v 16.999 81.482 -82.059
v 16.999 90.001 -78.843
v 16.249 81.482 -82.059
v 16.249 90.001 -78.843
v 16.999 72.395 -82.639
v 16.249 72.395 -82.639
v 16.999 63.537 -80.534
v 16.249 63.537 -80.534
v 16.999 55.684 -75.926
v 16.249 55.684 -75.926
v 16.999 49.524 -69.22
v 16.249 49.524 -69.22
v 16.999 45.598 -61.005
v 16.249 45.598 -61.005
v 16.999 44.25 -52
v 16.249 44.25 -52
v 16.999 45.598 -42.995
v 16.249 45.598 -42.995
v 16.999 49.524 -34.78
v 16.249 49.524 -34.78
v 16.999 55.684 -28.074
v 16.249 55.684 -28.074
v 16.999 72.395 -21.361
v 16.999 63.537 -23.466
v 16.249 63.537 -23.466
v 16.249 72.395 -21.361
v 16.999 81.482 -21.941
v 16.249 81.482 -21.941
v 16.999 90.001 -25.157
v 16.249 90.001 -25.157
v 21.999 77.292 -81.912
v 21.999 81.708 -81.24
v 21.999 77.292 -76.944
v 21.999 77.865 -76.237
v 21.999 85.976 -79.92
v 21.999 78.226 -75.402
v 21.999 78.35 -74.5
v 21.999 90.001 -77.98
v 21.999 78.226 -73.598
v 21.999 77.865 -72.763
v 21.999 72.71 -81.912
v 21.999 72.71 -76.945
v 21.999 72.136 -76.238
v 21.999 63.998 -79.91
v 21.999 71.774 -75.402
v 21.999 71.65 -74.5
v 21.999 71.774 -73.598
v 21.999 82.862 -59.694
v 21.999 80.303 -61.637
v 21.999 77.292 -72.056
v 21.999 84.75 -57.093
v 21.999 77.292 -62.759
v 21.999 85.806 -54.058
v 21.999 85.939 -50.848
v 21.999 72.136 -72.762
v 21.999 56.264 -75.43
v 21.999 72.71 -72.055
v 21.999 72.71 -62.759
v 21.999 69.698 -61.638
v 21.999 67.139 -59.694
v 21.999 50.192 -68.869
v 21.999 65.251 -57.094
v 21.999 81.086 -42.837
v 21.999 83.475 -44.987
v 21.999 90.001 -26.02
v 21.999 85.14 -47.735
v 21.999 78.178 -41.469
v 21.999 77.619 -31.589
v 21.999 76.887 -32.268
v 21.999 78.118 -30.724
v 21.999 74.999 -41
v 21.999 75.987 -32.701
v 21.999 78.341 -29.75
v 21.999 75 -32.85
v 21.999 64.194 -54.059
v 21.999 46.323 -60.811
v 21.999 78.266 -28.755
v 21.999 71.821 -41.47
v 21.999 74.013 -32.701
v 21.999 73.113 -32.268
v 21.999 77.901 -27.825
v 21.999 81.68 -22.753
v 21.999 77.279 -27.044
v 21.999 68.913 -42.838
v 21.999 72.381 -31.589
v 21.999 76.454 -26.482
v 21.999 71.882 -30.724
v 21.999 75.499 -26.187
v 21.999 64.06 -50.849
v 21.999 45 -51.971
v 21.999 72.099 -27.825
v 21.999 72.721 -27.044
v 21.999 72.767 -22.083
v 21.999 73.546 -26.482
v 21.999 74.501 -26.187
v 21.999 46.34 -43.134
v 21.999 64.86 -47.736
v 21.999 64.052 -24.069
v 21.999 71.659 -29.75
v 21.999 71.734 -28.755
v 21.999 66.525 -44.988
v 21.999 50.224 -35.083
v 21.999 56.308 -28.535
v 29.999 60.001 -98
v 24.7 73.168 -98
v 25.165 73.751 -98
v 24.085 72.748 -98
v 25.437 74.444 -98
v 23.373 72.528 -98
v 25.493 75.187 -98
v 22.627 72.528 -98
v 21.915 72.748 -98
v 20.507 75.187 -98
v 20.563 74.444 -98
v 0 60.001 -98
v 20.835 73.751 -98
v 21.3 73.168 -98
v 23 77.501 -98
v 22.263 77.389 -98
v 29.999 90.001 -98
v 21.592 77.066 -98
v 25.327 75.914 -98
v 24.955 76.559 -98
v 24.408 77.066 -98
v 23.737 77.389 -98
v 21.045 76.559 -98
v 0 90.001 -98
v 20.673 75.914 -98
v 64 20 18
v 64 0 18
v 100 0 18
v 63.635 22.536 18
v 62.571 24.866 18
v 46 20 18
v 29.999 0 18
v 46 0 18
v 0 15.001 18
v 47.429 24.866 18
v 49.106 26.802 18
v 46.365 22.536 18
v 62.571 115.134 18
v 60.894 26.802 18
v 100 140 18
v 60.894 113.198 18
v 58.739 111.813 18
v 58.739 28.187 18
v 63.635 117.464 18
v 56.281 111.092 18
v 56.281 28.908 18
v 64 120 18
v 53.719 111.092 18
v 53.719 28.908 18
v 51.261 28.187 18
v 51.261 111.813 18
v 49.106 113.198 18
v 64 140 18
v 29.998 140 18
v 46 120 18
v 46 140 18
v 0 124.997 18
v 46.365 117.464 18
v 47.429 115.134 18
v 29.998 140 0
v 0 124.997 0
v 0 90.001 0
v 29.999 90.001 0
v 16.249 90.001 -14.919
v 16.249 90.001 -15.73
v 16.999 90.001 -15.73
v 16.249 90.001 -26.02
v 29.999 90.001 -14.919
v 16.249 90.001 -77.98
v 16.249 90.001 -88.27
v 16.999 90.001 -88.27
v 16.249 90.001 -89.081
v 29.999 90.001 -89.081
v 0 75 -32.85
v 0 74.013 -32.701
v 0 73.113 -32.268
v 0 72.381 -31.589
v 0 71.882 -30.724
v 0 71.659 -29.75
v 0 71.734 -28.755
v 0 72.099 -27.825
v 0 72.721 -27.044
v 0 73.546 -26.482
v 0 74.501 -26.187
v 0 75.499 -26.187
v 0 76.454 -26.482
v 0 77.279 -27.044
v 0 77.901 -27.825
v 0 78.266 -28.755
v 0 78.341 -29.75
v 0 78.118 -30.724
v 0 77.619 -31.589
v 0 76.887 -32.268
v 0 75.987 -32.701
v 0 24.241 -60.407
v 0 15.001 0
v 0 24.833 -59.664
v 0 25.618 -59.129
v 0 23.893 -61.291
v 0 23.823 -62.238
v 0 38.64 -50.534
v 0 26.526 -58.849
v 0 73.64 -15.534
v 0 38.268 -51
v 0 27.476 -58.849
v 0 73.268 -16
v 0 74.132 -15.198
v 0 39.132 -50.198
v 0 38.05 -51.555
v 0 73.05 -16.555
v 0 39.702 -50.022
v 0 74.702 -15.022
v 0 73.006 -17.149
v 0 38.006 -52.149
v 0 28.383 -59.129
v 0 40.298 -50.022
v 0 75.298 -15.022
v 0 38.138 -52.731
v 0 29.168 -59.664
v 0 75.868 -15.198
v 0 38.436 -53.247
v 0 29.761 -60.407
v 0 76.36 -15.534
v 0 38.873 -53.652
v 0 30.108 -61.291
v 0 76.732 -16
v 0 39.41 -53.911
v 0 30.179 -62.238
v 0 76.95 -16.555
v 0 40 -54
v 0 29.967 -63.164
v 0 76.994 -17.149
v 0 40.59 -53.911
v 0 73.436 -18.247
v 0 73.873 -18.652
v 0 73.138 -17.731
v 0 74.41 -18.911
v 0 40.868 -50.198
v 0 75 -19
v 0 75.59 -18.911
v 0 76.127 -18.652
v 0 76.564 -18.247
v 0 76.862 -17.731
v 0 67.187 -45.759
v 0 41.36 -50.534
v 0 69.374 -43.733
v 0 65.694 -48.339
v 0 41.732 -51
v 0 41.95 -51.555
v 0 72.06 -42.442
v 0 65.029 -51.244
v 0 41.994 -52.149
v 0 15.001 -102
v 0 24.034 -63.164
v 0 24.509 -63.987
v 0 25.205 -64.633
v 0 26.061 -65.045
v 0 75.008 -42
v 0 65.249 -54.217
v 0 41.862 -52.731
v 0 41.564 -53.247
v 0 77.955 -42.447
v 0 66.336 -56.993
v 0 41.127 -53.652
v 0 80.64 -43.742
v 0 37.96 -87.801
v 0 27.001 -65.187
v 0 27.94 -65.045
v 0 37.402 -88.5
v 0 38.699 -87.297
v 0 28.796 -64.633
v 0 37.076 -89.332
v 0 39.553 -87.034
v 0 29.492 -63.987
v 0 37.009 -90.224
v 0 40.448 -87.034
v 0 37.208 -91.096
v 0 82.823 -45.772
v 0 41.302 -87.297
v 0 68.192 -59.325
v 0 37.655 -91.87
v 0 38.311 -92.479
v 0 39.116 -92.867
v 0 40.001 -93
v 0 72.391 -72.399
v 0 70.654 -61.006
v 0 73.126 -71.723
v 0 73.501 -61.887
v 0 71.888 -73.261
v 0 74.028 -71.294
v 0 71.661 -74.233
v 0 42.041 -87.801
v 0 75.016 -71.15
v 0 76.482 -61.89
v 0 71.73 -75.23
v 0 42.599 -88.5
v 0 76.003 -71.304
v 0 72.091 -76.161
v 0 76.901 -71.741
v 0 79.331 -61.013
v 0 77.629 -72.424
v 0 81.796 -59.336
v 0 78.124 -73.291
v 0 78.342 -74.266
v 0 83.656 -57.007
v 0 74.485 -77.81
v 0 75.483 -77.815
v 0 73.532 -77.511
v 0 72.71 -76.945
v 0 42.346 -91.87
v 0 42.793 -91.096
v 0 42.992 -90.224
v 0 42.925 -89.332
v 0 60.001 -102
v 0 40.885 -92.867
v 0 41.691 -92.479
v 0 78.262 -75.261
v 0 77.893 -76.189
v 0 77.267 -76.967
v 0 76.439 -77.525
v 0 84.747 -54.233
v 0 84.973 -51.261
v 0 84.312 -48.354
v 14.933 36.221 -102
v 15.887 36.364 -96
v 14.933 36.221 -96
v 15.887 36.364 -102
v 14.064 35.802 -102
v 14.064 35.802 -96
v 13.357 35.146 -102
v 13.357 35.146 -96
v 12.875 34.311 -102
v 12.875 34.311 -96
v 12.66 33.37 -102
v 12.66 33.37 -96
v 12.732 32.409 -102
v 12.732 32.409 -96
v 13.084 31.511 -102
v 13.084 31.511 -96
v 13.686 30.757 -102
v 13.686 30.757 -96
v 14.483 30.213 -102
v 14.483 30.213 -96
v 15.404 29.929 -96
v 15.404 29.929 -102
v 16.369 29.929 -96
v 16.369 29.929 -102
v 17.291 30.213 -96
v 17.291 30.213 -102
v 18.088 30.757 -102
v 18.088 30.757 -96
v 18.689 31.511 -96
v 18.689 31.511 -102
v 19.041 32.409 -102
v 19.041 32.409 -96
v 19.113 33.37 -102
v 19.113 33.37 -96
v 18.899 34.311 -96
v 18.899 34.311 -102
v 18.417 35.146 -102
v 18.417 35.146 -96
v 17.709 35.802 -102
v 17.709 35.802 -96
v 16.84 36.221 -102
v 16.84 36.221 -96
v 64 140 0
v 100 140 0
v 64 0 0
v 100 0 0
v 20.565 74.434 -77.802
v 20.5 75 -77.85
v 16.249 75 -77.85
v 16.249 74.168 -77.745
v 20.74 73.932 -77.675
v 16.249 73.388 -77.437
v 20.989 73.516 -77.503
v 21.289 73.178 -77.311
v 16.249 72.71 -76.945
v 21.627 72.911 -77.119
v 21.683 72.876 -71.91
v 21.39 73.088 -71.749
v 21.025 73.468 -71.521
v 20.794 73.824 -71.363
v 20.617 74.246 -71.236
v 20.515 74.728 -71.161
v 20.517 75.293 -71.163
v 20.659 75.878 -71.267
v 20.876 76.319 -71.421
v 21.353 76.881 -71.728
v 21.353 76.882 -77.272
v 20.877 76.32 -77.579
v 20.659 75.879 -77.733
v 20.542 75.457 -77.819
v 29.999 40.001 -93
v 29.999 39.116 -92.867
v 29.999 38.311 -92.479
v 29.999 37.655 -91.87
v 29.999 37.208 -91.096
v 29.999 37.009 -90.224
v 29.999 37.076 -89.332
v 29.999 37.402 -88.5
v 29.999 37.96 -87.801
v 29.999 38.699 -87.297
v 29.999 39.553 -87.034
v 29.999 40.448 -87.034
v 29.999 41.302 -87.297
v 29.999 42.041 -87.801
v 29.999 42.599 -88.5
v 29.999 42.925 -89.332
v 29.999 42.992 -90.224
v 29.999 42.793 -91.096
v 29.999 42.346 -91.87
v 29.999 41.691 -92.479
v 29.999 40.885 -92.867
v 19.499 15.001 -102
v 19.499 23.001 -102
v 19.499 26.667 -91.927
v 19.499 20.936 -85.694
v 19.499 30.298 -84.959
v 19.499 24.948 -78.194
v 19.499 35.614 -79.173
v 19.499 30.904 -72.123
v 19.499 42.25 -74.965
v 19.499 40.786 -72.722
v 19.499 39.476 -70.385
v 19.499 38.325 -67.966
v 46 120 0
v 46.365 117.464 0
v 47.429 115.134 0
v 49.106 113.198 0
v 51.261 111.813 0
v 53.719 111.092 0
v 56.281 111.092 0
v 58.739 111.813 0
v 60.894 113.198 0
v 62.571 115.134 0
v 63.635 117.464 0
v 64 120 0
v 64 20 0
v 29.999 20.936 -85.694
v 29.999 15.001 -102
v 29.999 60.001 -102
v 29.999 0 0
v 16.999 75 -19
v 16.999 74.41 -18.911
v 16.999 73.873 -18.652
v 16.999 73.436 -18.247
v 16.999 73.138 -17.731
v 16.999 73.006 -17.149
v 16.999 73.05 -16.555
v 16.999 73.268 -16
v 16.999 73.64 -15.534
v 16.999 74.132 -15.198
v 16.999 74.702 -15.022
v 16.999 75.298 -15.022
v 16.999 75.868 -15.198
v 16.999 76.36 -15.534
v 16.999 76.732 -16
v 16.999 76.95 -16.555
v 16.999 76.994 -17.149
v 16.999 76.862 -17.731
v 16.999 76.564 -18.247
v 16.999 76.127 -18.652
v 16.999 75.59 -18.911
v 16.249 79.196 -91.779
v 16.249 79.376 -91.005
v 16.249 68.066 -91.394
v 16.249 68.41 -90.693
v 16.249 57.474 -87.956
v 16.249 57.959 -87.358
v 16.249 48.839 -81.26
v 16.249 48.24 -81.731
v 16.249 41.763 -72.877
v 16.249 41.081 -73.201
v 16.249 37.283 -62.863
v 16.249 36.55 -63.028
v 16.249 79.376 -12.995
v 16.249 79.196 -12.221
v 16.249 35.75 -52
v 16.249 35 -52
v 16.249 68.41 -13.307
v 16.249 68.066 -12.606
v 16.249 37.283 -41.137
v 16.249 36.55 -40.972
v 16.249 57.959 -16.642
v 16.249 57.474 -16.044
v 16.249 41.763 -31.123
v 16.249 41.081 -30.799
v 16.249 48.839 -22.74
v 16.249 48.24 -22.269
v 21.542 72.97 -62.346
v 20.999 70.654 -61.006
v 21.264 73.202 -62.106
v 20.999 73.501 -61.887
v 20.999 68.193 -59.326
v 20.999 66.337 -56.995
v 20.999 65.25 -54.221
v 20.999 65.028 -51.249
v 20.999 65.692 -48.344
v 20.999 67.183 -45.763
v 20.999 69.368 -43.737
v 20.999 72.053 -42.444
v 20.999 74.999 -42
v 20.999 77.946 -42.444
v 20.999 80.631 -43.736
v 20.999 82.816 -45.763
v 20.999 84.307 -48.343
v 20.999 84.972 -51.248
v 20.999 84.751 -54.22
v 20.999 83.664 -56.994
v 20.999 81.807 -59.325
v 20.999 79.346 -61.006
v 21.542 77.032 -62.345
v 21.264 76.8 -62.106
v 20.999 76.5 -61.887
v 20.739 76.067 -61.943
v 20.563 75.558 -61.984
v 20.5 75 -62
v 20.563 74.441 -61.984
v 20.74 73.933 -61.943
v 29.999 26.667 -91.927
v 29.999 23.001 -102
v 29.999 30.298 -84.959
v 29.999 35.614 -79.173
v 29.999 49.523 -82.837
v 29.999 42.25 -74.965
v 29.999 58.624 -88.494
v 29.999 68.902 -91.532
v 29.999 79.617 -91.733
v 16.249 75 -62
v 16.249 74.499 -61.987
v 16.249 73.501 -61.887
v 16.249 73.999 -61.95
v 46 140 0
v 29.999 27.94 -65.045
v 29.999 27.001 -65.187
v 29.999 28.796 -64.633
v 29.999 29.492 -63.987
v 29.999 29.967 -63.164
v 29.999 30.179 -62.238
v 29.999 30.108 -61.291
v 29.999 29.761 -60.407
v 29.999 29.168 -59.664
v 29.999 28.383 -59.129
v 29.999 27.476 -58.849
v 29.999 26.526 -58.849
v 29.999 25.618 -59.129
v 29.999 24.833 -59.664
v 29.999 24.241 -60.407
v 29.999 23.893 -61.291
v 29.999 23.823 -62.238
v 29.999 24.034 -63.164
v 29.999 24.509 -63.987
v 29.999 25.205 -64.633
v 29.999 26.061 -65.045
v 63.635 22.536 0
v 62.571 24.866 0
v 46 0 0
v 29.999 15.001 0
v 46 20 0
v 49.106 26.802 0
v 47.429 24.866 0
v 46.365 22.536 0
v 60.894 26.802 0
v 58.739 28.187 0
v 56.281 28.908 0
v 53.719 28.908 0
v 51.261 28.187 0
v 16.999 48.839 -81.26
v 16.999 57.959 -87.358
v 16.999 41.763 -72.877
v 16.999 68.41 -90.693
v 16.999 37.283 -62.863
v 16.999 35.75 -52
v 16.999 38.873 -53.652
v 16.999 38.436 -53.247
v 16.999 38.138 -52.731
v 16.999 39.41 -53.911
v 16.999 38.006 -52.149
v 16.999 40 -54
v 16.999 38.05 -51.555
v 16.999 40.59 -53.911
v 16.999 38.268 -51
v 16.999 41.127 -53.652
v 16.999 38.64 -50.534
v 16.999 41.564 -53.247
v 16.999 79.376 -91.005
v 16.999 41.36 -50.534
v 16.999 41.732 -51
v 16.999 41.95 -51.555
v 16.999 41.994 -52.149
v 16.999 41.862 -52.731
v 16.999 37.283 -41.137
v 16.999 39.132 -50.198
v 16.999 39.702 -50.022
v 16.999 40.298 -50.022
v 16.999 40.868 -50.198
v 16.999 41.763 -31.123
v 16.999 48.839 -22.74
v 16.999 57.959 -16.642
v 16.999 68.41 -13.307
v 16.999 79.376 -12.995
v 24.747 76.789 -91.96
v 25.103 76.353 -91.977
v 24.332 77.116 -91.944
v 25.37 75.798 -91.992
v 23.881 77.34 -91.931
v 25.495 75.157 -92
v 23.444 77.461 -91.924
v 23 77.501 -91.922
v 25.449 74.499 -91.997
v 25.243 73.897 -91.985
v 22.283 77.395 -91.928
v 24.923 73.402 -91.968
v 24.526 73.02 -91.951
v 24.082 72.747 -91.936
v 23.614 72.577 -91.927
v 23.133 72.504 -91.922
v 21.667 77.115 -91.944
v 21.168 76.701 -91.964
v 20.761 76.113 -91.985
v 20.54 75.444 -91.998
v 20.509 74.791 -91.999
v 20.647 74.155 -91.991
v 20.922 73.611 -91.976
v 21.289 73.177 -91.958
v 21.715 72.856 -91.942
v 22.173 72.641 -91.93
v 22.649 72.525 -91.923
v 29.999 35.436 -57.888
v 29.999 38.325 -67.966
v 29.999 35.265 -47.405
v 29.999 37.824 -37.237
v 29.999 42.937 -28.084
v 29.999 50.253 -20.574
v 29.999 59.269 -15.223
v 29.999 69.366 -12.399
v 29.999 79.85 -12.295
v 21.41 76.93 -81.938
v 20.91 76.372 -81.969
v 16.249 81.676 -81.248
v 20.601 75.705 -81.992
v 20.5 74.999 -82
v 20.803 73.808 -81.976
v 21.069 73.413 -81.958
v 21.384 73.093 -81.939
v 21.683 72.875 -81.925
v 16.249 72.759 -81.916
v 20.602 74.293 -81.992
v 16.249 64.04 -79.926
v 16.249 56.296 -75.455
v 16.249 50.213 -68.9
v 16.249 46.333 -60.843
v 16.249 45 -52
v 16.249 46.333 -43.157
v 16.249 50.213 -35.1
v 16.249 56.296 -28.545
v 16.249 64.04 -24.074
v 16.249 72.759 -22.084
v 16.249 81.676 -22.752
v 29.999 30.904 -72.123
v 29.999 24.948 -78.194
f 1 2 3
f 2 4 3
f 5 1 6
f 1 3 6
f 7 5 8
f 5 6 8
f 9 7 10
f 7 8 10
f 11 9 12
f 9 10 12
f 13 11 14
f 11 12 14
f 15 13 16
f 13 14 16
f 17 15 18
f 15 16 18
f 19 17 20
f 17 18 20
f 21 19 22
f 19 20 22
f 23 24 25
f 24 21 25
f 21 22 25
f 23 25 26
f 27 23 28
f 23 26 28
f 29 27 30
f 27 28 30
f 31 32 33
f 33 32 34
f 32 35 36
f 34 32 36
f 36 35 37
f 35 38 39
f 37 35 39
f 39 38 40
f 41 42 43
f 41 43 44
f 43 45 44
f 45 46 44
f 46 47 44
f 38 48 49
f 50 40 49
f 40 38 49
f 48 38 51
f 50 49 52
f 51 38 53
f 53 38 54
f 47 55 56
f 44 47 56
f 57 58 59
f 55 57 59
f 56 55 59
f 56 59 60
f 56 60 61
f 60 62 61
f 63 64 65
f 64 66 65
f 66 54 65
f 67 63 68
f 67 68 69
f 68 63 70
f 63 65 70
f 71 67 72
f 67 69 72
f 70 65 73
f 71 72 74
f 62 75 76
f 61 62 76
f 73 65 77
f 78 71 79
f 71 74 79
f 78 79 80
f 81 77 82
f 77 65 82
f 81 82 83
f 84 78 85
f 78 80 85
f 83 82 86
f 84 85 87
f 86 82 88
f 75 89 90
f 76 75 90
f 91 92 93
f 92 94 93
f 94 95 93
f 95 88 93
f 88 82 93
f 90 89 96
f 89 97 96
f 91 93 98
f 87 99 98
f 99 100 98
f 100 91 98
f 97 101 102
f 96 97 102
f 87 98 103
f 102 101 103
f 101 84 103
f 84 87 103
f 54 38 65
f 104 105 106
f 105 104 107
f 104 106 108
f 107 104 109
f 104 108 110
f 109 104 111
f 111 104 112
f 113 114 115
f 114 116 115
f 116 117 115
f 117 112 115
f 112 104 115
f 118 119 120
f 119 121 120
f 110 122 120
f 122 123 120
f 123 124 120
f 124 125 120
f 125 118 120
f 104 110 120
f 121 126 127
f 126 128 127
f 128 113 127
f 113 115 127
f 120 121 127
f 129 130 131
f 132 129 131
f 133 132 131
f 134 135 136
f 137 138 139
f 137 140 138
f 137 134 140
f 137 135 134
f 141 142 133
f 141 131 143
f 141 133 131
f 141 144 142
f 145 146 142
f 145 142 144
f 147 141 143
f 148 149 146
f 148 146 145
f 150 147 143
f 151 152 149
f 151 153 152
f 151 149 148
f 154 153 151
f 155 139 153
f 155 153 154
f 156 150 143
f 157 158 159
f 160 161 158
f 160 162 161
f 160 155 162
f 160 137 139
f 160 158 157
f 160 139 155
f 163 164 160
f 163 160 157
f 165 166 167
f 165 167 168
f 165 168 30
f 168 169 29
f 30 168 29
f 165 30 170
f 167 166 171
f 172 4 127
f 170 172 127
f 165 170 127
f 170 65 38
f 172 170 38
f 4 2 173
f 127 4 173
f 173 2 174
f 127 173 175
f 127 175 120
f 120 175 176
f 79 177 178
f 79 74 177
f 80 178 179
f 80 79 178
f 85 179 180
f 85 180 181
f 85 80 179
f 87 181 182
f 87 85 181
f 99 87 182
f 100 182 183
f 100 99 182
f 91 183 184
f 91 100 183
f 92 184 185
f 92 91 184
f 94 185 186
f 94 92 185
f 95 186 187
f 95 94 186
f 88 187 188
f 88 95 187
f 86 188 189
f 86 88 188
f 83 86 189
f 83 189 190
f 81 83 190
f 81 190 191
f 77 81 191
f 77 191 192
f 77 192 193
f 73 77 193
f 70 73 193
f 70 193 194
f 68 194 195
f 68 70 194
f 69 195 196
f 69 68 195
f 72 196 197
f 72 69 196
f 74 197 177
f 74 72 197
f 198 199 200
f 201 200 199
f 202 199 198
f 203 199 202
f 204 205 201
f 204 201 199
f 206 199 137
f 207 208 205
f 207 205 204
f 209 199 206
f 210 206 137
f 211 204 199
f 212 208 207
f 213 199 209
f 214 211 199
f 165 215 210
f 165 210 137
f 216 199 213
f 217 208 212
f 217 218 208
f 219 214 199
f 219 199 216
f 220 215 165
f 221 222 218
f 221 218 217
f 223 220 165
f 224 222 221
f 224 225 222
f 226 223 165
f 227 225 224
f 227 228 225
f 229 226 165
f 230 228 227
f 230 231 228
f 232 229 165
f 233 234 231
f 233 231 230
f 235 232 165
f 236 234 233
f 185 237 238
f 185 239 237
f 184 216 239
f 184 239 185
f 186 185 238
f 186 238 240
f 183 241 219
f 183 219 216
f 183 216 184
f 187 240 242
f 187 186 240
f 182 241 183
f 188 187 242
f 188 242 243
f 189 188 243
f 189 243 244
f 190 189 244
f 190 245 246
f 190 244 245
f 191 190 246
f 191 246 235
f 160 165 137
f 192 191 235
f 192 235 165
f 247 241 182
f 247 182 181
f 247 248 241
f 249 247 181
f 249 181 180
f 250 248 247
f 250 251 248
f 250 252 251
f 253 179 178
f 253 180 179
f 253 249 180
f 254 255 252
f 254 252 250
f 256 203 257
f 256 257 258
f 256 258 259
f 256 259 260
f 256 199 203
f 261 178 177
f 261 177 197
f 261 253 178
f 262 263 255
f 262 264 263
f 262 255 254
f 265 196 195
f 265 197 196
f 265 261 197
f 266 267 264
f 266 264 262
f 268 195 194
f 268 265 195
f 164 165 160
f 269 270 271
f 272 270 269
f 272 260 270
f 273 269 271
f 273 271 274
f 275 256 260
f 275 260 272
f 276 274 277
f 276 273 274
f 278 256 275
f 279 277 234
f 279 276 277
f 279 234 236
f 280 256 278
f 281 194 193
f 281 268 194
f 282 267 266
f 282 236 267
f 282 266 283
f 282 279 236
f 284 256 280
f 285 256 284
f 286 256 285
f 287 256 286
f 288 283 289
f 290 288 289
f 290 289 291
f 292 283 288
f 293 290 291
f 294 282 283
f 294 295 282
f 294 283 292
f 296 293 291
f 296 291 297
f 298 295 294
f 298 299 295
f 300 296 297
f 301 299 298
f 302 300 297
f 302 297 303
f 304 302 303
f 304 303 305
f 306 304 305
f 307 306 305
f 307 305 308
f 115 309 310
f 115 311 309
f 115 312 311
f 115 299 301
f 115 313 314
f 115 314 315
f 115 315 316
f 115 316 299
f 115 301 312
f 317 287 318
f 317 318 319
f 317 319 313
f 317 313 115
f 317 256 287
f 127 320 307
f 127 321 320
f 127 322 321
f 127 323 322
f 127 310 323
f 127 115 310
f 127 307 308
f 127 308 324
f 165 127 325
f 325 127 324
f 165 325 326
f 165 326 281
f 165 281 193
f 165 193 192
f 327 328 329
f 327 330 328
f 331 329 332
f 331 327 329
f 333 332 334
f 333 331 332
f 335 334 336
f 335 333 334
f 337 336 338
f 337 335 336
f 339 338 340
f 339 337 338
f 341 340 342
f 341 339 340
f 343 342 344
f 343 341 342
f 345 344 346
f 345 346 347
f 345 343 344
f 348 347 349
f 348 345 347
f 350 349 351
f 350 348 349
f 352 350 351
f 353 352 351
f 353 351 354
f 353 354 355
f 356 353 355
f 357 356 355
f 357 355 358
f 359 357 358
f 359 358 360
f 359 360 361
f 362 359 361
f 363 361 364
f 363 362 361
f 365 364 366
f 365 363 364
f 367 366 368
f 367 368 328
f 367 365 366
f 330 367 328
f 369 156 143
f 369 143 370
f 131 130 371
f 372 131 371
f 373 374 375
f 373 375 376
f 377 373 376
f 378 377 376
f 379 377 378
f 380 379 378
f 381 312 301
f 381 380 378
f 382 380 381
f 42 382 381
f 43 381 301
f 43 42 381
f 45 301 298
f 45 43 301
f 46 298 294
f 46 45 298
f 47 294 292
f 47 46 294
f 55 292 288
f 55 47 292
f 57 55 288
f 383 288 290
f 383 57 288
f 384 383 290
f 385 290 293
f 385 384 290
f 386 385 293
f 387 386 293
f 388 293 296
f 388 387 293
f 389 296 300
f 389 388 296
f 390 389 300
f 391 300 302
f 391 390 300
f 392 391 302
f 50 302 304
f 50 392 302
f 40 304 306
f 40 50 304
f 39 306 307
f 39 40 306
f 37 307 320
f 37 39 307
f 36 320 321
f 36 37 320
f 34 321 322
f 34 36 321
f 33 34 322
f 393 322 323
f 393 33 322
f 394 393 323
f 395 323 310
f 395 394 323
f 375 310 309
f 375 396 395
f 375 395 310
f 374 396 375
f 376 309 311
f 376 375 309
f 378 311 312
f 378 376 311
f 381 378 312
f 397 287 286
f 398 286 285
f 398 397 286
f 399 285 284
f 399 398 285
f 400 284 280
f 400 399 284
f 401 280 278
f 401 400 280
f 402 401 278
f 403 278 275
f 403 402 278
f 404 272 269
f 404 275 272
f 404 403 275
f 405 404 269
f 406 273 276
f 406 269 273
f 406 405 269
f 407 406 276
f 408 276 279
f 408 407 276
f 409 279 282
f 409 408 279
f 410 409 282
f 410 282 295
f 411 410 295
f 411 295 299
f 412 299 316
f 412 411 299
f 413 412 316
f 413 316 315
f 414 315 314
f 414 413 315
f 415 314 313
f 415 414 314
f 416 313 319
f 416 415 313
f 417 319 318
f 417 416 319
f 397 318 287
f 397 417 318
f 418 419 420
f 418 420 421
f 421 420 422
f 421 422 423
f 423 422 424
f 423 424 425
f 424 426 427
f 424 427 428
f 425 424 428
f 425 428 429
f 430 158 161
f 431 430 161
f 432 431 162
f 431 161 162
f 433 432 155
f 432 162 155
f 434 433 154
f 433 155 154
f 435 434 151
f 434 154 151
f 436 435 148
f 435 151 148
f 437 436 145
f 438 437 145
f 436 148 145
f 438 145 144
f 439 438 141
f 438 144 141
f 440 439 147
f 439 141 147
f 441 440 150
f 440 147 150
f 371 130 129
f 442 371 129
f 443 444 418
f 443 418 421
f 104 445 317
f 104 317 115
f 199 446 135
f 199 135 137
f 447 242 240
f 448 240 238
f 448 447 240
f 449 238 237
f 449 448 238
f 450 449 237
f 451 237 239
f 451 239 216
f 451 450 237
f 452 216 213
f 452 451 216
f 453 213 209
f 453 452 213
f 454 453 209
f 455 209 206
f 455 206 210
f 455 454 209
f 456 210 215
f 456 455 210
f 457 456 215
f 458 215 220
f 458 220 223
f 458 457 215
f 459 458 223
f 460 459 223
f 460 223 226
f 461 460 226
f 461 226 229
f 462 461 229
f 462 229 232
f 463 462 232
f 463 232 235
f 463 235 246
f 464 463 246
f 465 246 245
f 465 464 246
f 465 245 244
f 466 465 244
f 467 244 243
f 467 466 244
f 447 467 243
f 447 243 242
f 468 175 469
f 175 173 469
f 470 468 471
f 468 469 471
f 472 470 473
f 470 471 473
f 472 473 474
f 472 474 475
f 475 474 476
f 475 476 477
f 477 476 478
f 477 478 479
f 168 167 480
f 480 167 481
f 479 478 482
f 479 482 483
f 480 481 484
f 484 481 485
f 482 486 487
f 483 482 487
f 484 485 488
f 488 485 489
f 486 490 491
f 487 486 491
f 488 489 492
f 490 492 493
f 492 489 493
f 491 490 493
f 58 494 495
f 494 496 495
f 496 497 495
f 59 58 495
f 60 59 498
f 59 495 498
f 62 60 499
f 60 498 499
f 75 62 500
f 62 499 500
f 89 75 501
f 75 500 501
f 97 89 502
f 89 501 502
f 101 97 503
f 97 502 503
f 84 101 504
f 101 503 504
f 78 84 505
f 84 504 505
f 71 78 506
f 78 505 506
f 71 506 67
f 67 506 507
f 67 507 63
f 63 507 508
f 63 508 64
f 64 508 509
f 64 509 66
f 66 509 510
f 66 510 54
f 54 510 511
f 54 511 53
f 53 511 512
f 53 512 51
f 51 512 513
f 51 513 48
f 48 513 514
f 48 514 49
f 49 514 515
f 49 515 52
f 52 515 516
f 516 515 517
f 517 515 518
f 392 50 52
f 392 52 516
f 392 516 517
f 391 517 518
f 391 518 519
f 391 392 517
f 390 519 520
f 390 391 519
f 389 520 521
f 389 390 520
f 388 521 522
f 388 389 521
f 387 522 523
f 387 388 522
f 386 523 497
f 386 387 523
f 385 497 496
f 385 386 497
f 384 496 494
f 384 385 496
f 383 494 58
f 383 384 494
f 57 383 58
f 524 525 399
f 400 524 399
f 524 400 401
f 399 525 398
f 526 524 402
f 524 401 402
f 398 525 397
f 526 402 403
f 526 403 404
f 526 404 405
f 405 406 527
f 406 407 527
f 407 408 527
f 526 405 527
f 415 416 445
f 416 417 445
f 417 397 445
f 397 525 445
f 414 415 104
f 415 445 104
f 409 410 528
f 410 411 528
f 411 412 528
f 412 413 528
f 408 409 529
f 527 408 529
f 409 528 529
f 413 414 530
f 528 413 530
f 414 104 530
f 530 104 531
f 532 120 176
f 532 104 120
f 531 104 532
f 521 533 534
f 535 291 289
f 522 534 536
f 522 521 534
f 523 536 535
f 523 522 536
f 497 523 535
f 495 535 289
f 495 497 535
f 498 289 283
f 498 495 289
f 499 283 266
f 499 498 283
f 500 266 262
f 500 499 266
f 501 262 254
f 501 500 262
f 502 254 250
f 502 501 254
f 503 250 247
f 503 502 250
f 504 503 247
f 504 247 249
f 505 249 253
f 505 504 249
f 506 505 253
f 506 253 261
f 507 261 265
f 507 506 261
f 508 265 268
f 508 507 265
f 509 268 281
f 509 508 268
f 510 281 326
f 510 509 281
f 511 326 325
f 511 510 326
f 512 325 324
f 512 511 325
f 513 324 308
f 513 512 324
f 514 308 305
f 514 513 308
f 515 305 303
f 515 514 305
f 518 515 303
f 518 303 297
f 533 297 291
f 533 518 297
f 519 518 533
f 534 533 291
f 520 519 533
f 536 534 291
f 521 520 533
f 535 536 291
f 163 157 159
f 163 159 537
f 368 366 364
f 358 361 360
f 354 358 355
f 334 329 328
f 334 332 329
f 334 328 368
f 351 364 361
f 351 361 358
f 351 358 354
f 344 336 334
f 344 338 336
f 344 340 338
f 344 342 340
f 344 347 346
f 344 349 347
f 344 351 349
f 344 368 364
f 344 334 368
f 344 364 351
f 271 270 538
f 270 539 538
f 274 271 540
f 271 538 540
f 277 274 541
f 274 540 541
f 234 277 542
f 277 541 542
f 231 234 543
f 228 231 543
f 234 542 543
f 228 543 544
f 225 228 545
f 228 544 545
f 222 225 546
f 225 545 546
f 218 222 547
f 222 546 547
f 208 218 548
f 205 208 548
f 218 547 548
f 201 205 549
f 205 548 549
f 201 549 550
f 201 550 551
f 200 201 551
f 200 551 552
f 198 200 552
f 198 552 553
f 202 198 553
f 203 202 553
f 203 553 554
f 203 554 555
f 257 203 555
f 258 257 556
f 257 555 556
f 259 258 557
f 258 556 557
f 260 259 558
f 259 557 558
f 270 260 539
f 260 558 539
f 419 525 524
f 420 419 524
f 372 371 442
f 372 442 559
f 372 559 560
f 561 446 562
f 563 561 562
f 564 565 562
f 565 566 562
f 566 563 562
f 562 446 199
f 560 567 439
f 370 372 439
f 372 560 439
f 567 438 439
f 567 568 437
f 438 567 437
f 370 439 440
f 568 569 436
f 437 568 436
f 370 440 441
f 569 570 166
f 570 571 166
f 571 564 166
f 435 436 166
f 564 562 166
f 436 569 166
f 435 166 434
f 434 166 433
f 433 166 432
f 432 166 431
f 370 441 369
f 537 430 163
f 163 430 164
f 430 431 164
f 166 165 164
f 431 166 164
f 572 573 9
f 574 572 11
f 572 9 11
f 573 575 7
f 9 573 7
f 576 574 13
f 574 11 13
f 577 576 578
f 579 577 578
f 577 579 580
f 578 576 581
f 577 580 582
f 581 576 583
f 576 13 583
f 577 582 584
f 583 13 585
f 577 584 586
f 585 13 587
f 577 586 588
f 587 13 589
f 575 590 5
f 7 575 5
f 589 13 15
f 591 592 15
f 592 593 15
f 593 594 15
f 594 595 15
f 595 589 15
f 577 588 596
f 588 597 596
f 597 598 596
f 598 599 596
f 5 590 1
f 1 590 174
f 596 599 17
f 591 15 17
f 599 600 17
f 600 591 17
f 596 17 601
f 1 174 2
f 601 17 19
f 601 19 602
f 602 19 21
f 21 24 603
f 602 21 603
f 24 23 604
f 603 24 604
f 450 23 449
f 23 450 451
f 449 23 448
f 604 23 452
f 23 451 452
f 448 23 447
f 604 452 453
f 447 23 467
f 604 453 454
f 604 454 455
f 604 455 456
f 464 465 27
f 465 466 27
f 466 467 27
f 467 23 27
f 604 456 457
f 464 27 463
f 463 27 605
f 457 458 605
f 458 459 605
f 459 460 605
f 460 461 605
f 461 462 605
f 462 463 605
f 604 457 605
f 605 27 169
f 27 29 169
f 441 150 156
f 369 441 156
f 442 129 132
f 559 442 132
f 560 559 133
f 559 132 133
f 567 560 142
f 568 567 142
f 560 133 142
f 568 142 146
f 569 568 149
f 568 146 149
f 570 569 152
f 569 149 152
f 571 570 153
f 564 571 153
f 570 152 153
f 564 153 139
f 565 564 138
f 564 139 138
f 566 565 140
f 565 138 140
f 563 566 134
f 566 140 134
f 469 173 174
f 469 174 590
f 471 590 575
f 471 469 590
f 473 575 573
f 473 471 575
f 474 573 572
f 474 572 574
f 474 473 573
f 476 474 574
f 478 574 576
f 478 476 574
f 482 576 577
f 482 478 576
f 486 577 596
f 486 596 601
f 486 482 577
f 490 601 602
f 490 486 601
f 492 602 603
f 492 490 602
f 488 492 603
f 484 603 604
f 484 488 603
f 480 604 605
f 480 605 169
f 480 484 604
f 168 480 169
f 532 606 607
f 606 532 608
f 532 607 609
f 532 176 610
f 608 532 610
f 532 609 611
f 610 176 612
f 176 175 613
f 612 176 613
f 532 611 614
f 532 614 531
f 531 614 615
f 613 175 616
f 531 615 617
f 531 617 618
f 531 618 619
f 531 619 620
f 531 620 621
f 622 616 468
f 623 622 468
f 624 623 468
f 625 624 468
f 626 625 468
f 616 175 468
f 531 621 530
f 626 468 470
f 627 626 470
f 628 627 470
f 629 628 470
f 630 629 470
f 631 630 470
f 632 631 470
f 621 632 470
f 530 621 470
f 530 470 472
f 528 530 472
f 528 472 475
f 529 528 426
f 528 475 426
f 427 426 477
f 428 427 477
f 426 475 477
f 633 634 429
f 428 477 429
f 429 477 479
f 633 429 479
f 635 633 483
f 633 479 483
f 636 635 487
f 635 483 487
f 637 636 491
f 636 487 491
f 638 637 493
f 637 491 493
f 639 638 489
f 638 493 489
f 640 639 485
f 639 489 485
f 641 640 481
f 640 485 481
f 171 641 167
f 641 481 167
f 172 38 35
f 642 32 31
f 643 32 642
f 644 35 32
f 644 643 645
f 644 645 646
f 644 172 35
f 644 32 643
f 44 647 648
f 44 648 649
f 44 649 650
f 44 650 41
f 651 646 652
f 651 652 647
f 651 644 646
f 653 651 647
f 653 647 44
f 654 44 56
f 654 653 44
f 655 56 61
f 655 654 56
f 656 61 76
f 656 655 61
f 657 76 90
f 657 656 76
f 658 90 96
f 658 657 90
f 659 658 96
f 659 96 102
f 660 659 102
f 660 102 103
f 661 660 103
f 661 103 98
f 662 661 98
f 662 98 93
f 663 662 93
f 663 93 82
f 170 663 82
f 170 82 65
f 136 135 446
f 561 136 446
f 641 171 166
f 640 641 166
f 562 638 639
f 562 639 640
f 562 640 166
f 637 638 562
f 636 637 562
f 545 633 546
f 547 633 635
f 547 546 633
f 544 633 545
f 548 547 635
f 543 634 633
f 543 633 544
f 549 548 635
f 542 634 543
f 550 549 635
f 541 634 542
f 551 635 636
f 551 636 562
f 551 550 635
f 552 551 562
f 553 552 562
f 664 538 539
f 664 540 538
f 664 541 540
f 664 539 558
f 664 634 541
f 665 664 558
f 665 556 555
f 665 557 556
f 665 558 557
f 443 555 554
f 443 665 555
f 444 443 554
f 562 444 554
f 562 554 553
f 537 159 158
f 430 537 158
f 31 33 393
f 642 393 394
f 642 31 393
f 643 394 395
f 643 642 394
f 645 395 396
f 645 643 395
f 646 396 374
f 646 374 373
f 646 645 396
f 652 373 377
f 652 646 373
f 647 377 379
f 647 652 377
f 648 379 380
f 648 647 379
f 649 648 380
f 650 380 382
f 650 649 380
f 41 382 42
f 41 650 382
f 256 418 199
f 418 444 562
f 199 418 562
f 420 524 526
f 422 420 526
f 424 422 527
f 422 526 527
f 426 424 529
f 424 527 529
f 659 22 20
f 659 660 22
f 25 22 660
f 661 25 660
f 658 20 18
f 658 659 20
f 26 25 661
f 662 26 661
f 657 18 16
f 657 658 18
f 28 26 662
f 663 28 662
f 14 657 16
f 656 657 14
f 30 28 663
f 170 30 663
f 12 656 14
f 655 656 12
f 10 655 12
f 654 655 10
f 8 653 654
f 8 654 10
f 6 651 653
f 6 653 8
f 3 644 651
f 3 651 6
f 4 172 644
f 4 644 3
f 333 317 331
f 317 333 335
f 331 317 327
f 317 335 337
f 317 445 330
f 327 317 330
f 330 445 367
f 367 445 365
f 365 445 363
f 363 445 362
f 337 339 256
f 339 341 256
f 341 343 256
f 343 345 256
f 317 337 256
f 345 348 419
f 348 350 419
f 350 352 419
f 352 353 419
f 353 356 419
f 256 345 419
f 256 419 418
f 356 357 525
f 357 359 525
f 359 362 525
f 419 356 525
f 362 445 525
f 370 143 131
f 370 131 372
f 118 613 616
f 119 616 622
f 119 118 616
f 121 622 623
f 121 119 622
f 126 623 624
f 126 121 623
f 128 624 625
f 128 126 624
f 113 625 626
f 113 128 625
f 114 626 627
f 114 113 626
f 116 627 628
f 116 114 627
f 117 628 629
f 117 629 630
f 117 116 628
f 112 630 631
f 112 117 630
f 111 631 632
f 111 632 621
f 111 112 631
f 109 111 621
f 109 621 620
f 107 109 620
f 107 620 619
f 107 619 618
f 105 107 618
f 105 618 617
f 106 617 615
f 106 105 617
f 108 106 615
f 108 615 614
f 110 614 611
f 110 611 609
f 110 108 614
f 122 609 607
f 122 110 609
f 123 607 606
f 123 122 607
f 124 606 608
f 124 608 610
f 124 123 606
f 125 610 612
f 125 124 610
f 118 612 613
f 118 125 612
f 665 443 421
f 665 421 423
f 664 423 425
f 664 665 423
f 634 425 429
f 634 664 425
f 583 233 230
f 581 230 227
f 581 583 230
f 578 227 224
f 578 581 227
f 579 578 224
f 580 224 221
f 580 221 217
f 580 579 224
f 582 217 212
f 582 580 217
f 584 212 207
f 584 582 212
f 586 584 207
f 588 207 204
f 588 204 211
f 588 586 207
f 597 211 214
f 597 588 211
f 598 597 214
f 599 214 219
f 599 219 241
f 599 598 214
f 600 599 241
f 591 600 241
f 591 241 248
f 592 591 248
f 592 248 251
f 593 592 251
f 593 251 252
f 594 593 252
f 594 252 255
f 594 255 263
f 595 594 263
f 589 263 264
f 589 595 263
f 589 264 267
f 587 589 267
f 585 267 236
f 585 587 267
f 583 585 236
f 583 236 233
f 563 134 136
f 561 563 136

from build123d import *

# Parameters (mm, degrees)
EXTRUDE_1_DEPTH                  = 10.5
SKETCH_2_W                       = 102.00000000000001
SKETCH_2_H                       = 75.00000000000009
EXTRUDE_2_DEPTH                  = 19.4993693487819
EXTRUDE_3_DEPTH                  = 18.000000000000004
SKETCH_4_W                       = 18.000000000000004
SKETCH_4_H                       = 140
EXTRUDE_4_DEPTH                  = 70.0006306512181
EXTRUDE_START                    = 10.499999999999998
EXTRUDE_5_DEPTH                  = 10.499999999999998
CUT_EXTRUDE_1_REACH              = 194.401
SKETCH_7_W                       = 4.000000000000014
SKETCH_7_H                       = 29.999999999999993
CUT_EXTRUDE_2_DEPTH              = 201.0099997500125
CUT_EXTRUDE_3_DEPTH              = 210.76176963403032
CUT_EXTRUDE_4_DEPTH              = 210.76176963403032
EXTRUDE_6_DEPTH                  = 0.7500000000000007
HOLE_WIZARD_M521_D               = 61.5
EXTRUDE_7_DEPTH                  = 5.749999999999998
HOLE_WIZARD_6_7_6_7_1_AT_2_COUNT = 2
HOLE_WIZARD_6_7_6_7_1_AT_2_PITCH = 45
HOLE_WIZARD_4_0_4_1_AT_2_COUNT   = 2
HOLE_WIZARD_4_0_4_1_AT_2_PITCH   = 49.49747468305833
CHAMFER_1_SIZE                   = 0.9999999999999991
EXTRUDE_START_2                  = -16.249369
SKETCH_28_R                      = 3.35
SKETCH_28_R_2                    = 9.999999999999993
SKETCH_28_R_3                    = 3.350000000000003
EXTRUDE_8_DEPTH                  = 16.249369


with BuildPart() as part:
    # Эскиз1 → Бобышка-Вытянуть1 (new body)
    with BuildSketch(Plane(origin=(29.9993693487819, 0, 0), x_dir=(0, 0, -1), z_dir=(1, 0, 0))):
        with BuildLine():
            Line((14.919229074297327, 90.0005475751909), (0, 90.0005475751909))
            Line((0, 90.0005475751909), (0, 15.0005475751908))
            Line((0, 15.0005475751908), (102.00000000000001, 15.0005475751908))
            Line((102.00000000000001, 15.0005475751908), (85.69382268537409, 20.93551075238141))
            ThreePointArc((85.69382268537409, 20.93551075238141), (74.94644857866616, 27.70982740688085), (67.9664449575318, 38.324768093192546))
            ThreePointArc((67.9664449575318, 38.324768093192546), (24.088528585175357, 46.3477790832992), (14.919229074297327, 90.0005475751909))
        make_face()
    extrude(amount=-EXTRUDE_1_DEPTH)

    # Эскиз2 → Бобышка-Вытянуть2 (add)
    with BuildSketch(Plane.ZY.offset(-19.4993693487819)):
        with Locations((-51.00000000000001, 52.50054757519085)):
            Rectangle(SKETCH_2_W, SKETCH_2_H)
    extrude(amount=EXTRUDE_2_DEPTH)

    # Эскиз3 → Бобышка-Вытянуть3 (add)
    with BuildSketch(Plane.XY):
        Polygon((29.999369348781915, -6.94e-15), (3.47e-15, 15.000547575190799), (0, 124.997494914823), (29.997641385548, 140), (29.999369348781904, 140), align=None)
    extrude(amount=EXTRUDE_3_DEPTH)

    # Эскиз4 → Бобышка-Вытянуть4 (add)
    with BuildSketch(Plane(origin=(29.9993693487819, 0, 0), x_dir=(0, 0, -1), z_dir=(1, 0, 0))):
        with Locations((-9.000000000000002, 70)):
            Rectangle(SKETCH_4_W, SKETCH_4_H)
    extrude(amount=EXTRUDE_4_DEPTH)

    # Эскиз5 → Бобышка-Вытянуть5 (add)
    with BuildSketch(Plane(origin=(19.4993693487819, 0, 0), x_dir=(0, 0, -1), z_dir=(1, 0, 0)).offset(EXTRUDE_START)):
        with BuildLine():
            Line((89.08077092570272, 90.0005475751909), (102.00000000000001, 90.0005475751909))
            Line((102.00000000000001, 90.0005475751909), (102.00000000000001, 23.000547575190808))
            Line((102.00000000000001, 23.000547575190808), (91.92678266011816, 26.666898850201964))
            ThreePointArc((91.92678266011816, 26.666898850201964), (81.8910585435448, 32.765618882150974), (74.9654117449494, 42.24958224106233))
            ThreePointArc((74.9654117449494, 42.24958224106233), (90.35915387380979, 63.660894475956894), (89.08077092570272, 90.0005475751909))
        make_face()
    extrude(amount=-EXTRUDE_5_DEPTH)

    # Эскиз6 → Вырез-Вытянуть1 (cut, up to next)
    with BuildSketch(Plane(origin=(16.2493693487819, 0, 0), x_dir=(0, -1, 0), z_dir=(-1, 0, 0)), mode=Mode.PRIVATE) as cut_extrude_1_sk1:
        with BuildLine():
            Line((-90.0005475751909, -14.919229074297327), (-90.0005475751909, -89.08077092570272))
            ThreePointArc((-90.0005475751909, -89.08077092570272), (-34.999999999999936, -52), (-90.0005475751909, -14.919229074297327))
        make_face()
    cut_extrude_1_tool1 = extrude(cut_extrude_1_sk1.sketch, amount=-CUT_EXTRUDE_1_REACH, mode=Mode.PRIVATE) & part.part
    add(cut_extrude_1_tool1.solids().sort_by_distance((16.249369, 65.774947, -52))[0], mode=Mode.SUBTRACT)

    # Эскиз7 → Вырез-Вытянуть2 (cut, through all)
    with BuildSketch(Plane.ZY):
        with Locations((-100, 75.0005475751909)):
            Rectangle(SKETCH_7_W, SKETCH_7_H)
    extrude(amount=-CUT_EXTRUDE_2_DEPTH, mode=Mode.SUBTRACT)

    # Эскиз8 → Вырез-Вытянуть3 (cut, through all)
    with BuildSketch(Plane.XY.offset(18.000000000000004)):
        with BuildLine():
            Line((64, 140), (45.999999999999986, 140))
            Line((45.999999999999986, 140), (46, 120))
            ThreePointArc((46, 120), (55, 111), (64, 120))
            Line((64, 120), (64, 140))
        make_face()
    extrude(amount=-CUT_EXTRUDE_3_DEPTH, mode=Mode.SUBTRACT)

    # Эскиз9 → Вырез-Вытянуть4 (cut, through all)
    with BuildSketch(Plane.XY.offset(18.000000000000004)):
        with BuildLine():
            Line((46.00000000000001, 0), (64, 0))
            Line((64, 0), (64, 20.000000000000004))
            ThreePointArc((64, 20.000000000000004), (55, 29), (45.999999999999986, 20.000000000000004))
            Line((45.999999999999986, 20.000000000000004), (46.00000000000001, 0))
        make_face()
    extrude(amount=-CUT_EXTRUDE_4_DEPTH, mode=Mode.SUBTRACT)

    # Эскиз10 → Бобышка-Вытянуть6 (add)
    with BuildSketch(Plane(origin=(16.2493693487819, 0, 0), x_dir=(0, 0, -1), z_dir=(1, 0, 0))):
        with BuildLine():
            Line((15.729542704227807, 90.0005475751909), (88.27045729577222, 90.00054757519085))
            ThreePointArc((88.27045729577222, 90.00054757519085), (51.999999999999986, 35.75000000000001), (15.729542704227807, 90.0005475751909))
        make_face()
    extrude(amount=EXTRUDE_6_DEPTH)

    # Отверстие с зазором M521 (through all)
    with Locations(Plane(origin=(16.999369348781904, 0, 0), x_dir=(0, 0, -1), z_dir=(1, 0, 0))):
        with Locations((52, 75)):
            Hole(HOLE_WIZARD_M521_D / 2)

    # Эскиз14 → Отверстие1 (revolve, cut)
    with BuildSketch(Plane(origin=(29.9993693487819, 27.0005475751908, -62), x_dir=(0, 0, -1), z_dir=(0, 1, 0))):
        Polygon((0, 0), (0, 29.9993693487819), (3.1869530848864884, 29.9993693487819), (3.186953084886492, -8.3e-16), align=None)
    revolve(axis=Axis((-80.0006306512181, 27.0005475751908, -62), (1, 0, 0)), mode=Mode.SUBTRACT)

    # Эскиз20 → Диаметр отверстия Ø4.0 (4)1 (revolve, cut)
    with BuildSketch(Plane(origin=(16.999369348781904, 75, -17), x_dir=(0, 0, -1), z_dir=(0, 1, 0))):
        Polygon((0, 0), (-4.16e-15, 16.999369348781904), (1.9999999999999978, 16.999369348781904), (1.9999999999999896, -1.31e-15), align=None)
    hole_wizard_4_0_4_1 = revolve(axis=Axis((23.349369348781895, 75, -17), (-1, 0, 0)), mode=Mode.SUBTRACT)

    # Диаметр отверстия Ø4.0 (4)1 at 2: Диаметр отверстия Ø4.0 (4)1 ×2
    with Locations(*[Vector(0, -0.7071067811865475, -0.7071067811865477) * (i * HOLE_WIZARD_4_0_4_1_AT_2_PITCH) for i in range(1, HOLE_WIZARD_4_0_4_1_AT_2_COUNT)]):
        add(hole_wizard_4_0_4_1, mode=Mode.SUBTRACT)

    # Эскиз22 → Диаметр отверстия Ø6.0 (6)1 (revolve, cut)
    with BuildSketch(Plane(origin=(29.9993693487819, 40.0005475751908, -90), x_dir=(0, 0, -1), z_dir=(0, 1, 0))):
        Polygon((0, 0), (-7.35e-15, 30.000369348781906), (2.9999999999999867, 30.000369348781906), (2.9999999999999907, -1.19e-15), align=None)
    revolve(axis=Axis((36.34936934878189, 40.0005475751908, -90), (-1, 0, 0)), mode=Mode.SUBTRACT)


with BuildPart() as body_2:
    # Эскиз13 → Бобышка-Вытянуть7 (new body)
    with BuildSketch(Plane(origin=(16.2493693487819, 0, 0), x_dir=(0, -1, 0), z_dir=(-1, 0, 0))):
        with BuildLine():
            Line((-90.0005475751909, -26.01955403684463), (-90.0005475751909, -77.98044596315543))
            ThreePointArc((-90.0005475751909, -77.98044596315543), (-44.99999999999993, -51.99999999999999), (-90.0005475751909, -26.01955403684463))
        make_face()
    extrude(amount=-EXTRUDE_7_DEPTH)

    # Эскиз16 → Диаметр отверстия Ø6.7 (6.7)1 (revolve, cut)
    with BuildSketch(Plane(origin=(21.9993693487819, 75, -74.5), x_dir=(0, 0, -1), z_dir=(0, 1, 0))):
        Polygon((0, 0), (-1.41e-15, 5.749999999999998), (3.3500000000000045, 5.749999999999998), (3.3499999999999934, -1.15e-15), align=None)
    hole_wizard_6_7_6_7_1 = revolve(axis=Axis((28.34936934878189, 75, -74.5), (-1, 0, 0)), mode=Mode.SUBTRACT)

    # Диаметр отверстия Ø6.7 (6.7)1 at 2: Диаметр отверстия Ø6.7 (6.7)1 ×2
    with Locations(*[(0, 0, i * HOLE_WIZARD_6_7_6_7_1_AT_2_PITCH) for i in range(1, HOLE_WIZARD_6_7_6_7_1_AT_2_COUNT)]):
        add(hole_wizard_6_7_6_7_1, mode=Mode.SUBTRACT)

    # Эскиз18 → Диаметр отверстия Ø20.0 (20)1 (revolve, cut)
    with BuildSketch(Plane(origin=(21.9993693487819, 75, -52.00000000000001), x_dir=(0, 0, -1), z_dir=(0, 1, 0))):
        Polygon((0, 0), (-1.41e-15, 5.7510000000000066), (9.99999999999999, 5.7510000000000066), (9.99999999999999, -3.3e-16), align=None)
    revolve(axis=Axis((28.34936934878189, 75, -52.00000000000001), (-1, 0, 0)), mode=Mode.SUBTRACT)


with BuildPart() as hole_wizard_5_0_5_1_tool:
    # Эскиз24 → Диаметр отверстия Ø5.0 (5)1 (revolve)
    with BuildSketch(Plane(origin=(23, 75.0005475751909, -98), x_dir=(0, 1, 0), z_dir=(1, 0, 0))):
        Polygon((0, 0), (-1.127e-14, 45.999999999999986), (2.499999999999981, 45.999999999999986), (2.4999999999999867, -1.25e-15), align=None)
    revolve(axis=Axis((23, 75.0005475751909, -104.35), (0, 0, 1)))


with BuildPart() as part_1:
    add(part.part)

    # Диаметр отверстия Ø5.0 (5)1: cut by hole_wizard_5_0_5_1_tool
    add(hole_wizard_5_0_5_1_tool.part, mode=Mode.SUBTRACT)

    # Эскиз26 → Отверстие с зазором M61 (revolve, cut)
    with BuildSketch(Plane(origin=(15.8866729980809, 33.128633292951, -102.00000000000001), x_dir=(0, 1, 0), z_dir=(1, 0, 0))):
        Polygon((0, 0), (-1.47e-15, 5.999999999999993), (3.2357711959407984, 6.000000000000005), (3.2357711959408, -1.16e-15), align=None)
    revolve(axis=Axis((15.8866729980809, 33.128633292951, -108.35000000000001), (0, 0, 1)), mode=Mode.SUBTRACT)


with BuildPart() as body_2_1:
    add(body_2.part)

    # Диаметр отверстия Ø5.0 (5)1: cut by hole_wizard_5_0_5_1_tool
    add(hole_wizard_5_0_5_1_tool.part, mode=Mode.SUBTRACT)

    # Фаска1
    chamfer_1_edges = [body_2_1.edges().sort_by_distance(p)[0] for p in [
        (21.9993693487819, 74.99943746278025, -42.00000001582242),
    ]]
    chamfer(chamfer_1_edges, length=CHAMFER_1_SIZE)


with BuildPart() as extrude_8_tool:
    # Эскиз28 → Бобышка-Вытянуть8 (new body)
    with BuildSketch(Plane.ZY.offset(EXTRUDE_START_2)):
        with BuildLine():
            Line((-78.84298926059529, 90.0005475751909), (-25.157010739404722, 90.0005475751909))
            ThreePointArc((-25.157010739404722, 90.0005475751909), (-52.000000000000014, 44.250000000000014), (-78.84298926059529, 90.0005475751909))
        make_face()
        with Locations(Location((-29.500000000000004, 75, 0), (0, 0, 180))):
            Circle(SKETCH_28_R, mode=Mode.SUBTRACT)
        with Locations(Location((-52.00000000000001, 75, 0), (0, 0, 188.618876561))):
            Circle(SKETCH_28_R_2, mode=Mode.SUBTRACT)
        with Locations(Location((-74.5, 75, 0), (0, 0, 223.135094042))):
            Circle(SKETCH_28_R_3, mode=Mode.SUBTRACT)
    extrude(amount=EXTRUDE_8_DEPTH)


with BuildPart() as part_2:
    add(part_1.part)


with BuildPart() as part_3:
    # Бобышка-Вытянуть8: joined with extrude_8_tool
    add(part_2.part.fuse(extrude_8_tool.part, body_2_1.part, tol=0.00001))


solid = part_3.part
